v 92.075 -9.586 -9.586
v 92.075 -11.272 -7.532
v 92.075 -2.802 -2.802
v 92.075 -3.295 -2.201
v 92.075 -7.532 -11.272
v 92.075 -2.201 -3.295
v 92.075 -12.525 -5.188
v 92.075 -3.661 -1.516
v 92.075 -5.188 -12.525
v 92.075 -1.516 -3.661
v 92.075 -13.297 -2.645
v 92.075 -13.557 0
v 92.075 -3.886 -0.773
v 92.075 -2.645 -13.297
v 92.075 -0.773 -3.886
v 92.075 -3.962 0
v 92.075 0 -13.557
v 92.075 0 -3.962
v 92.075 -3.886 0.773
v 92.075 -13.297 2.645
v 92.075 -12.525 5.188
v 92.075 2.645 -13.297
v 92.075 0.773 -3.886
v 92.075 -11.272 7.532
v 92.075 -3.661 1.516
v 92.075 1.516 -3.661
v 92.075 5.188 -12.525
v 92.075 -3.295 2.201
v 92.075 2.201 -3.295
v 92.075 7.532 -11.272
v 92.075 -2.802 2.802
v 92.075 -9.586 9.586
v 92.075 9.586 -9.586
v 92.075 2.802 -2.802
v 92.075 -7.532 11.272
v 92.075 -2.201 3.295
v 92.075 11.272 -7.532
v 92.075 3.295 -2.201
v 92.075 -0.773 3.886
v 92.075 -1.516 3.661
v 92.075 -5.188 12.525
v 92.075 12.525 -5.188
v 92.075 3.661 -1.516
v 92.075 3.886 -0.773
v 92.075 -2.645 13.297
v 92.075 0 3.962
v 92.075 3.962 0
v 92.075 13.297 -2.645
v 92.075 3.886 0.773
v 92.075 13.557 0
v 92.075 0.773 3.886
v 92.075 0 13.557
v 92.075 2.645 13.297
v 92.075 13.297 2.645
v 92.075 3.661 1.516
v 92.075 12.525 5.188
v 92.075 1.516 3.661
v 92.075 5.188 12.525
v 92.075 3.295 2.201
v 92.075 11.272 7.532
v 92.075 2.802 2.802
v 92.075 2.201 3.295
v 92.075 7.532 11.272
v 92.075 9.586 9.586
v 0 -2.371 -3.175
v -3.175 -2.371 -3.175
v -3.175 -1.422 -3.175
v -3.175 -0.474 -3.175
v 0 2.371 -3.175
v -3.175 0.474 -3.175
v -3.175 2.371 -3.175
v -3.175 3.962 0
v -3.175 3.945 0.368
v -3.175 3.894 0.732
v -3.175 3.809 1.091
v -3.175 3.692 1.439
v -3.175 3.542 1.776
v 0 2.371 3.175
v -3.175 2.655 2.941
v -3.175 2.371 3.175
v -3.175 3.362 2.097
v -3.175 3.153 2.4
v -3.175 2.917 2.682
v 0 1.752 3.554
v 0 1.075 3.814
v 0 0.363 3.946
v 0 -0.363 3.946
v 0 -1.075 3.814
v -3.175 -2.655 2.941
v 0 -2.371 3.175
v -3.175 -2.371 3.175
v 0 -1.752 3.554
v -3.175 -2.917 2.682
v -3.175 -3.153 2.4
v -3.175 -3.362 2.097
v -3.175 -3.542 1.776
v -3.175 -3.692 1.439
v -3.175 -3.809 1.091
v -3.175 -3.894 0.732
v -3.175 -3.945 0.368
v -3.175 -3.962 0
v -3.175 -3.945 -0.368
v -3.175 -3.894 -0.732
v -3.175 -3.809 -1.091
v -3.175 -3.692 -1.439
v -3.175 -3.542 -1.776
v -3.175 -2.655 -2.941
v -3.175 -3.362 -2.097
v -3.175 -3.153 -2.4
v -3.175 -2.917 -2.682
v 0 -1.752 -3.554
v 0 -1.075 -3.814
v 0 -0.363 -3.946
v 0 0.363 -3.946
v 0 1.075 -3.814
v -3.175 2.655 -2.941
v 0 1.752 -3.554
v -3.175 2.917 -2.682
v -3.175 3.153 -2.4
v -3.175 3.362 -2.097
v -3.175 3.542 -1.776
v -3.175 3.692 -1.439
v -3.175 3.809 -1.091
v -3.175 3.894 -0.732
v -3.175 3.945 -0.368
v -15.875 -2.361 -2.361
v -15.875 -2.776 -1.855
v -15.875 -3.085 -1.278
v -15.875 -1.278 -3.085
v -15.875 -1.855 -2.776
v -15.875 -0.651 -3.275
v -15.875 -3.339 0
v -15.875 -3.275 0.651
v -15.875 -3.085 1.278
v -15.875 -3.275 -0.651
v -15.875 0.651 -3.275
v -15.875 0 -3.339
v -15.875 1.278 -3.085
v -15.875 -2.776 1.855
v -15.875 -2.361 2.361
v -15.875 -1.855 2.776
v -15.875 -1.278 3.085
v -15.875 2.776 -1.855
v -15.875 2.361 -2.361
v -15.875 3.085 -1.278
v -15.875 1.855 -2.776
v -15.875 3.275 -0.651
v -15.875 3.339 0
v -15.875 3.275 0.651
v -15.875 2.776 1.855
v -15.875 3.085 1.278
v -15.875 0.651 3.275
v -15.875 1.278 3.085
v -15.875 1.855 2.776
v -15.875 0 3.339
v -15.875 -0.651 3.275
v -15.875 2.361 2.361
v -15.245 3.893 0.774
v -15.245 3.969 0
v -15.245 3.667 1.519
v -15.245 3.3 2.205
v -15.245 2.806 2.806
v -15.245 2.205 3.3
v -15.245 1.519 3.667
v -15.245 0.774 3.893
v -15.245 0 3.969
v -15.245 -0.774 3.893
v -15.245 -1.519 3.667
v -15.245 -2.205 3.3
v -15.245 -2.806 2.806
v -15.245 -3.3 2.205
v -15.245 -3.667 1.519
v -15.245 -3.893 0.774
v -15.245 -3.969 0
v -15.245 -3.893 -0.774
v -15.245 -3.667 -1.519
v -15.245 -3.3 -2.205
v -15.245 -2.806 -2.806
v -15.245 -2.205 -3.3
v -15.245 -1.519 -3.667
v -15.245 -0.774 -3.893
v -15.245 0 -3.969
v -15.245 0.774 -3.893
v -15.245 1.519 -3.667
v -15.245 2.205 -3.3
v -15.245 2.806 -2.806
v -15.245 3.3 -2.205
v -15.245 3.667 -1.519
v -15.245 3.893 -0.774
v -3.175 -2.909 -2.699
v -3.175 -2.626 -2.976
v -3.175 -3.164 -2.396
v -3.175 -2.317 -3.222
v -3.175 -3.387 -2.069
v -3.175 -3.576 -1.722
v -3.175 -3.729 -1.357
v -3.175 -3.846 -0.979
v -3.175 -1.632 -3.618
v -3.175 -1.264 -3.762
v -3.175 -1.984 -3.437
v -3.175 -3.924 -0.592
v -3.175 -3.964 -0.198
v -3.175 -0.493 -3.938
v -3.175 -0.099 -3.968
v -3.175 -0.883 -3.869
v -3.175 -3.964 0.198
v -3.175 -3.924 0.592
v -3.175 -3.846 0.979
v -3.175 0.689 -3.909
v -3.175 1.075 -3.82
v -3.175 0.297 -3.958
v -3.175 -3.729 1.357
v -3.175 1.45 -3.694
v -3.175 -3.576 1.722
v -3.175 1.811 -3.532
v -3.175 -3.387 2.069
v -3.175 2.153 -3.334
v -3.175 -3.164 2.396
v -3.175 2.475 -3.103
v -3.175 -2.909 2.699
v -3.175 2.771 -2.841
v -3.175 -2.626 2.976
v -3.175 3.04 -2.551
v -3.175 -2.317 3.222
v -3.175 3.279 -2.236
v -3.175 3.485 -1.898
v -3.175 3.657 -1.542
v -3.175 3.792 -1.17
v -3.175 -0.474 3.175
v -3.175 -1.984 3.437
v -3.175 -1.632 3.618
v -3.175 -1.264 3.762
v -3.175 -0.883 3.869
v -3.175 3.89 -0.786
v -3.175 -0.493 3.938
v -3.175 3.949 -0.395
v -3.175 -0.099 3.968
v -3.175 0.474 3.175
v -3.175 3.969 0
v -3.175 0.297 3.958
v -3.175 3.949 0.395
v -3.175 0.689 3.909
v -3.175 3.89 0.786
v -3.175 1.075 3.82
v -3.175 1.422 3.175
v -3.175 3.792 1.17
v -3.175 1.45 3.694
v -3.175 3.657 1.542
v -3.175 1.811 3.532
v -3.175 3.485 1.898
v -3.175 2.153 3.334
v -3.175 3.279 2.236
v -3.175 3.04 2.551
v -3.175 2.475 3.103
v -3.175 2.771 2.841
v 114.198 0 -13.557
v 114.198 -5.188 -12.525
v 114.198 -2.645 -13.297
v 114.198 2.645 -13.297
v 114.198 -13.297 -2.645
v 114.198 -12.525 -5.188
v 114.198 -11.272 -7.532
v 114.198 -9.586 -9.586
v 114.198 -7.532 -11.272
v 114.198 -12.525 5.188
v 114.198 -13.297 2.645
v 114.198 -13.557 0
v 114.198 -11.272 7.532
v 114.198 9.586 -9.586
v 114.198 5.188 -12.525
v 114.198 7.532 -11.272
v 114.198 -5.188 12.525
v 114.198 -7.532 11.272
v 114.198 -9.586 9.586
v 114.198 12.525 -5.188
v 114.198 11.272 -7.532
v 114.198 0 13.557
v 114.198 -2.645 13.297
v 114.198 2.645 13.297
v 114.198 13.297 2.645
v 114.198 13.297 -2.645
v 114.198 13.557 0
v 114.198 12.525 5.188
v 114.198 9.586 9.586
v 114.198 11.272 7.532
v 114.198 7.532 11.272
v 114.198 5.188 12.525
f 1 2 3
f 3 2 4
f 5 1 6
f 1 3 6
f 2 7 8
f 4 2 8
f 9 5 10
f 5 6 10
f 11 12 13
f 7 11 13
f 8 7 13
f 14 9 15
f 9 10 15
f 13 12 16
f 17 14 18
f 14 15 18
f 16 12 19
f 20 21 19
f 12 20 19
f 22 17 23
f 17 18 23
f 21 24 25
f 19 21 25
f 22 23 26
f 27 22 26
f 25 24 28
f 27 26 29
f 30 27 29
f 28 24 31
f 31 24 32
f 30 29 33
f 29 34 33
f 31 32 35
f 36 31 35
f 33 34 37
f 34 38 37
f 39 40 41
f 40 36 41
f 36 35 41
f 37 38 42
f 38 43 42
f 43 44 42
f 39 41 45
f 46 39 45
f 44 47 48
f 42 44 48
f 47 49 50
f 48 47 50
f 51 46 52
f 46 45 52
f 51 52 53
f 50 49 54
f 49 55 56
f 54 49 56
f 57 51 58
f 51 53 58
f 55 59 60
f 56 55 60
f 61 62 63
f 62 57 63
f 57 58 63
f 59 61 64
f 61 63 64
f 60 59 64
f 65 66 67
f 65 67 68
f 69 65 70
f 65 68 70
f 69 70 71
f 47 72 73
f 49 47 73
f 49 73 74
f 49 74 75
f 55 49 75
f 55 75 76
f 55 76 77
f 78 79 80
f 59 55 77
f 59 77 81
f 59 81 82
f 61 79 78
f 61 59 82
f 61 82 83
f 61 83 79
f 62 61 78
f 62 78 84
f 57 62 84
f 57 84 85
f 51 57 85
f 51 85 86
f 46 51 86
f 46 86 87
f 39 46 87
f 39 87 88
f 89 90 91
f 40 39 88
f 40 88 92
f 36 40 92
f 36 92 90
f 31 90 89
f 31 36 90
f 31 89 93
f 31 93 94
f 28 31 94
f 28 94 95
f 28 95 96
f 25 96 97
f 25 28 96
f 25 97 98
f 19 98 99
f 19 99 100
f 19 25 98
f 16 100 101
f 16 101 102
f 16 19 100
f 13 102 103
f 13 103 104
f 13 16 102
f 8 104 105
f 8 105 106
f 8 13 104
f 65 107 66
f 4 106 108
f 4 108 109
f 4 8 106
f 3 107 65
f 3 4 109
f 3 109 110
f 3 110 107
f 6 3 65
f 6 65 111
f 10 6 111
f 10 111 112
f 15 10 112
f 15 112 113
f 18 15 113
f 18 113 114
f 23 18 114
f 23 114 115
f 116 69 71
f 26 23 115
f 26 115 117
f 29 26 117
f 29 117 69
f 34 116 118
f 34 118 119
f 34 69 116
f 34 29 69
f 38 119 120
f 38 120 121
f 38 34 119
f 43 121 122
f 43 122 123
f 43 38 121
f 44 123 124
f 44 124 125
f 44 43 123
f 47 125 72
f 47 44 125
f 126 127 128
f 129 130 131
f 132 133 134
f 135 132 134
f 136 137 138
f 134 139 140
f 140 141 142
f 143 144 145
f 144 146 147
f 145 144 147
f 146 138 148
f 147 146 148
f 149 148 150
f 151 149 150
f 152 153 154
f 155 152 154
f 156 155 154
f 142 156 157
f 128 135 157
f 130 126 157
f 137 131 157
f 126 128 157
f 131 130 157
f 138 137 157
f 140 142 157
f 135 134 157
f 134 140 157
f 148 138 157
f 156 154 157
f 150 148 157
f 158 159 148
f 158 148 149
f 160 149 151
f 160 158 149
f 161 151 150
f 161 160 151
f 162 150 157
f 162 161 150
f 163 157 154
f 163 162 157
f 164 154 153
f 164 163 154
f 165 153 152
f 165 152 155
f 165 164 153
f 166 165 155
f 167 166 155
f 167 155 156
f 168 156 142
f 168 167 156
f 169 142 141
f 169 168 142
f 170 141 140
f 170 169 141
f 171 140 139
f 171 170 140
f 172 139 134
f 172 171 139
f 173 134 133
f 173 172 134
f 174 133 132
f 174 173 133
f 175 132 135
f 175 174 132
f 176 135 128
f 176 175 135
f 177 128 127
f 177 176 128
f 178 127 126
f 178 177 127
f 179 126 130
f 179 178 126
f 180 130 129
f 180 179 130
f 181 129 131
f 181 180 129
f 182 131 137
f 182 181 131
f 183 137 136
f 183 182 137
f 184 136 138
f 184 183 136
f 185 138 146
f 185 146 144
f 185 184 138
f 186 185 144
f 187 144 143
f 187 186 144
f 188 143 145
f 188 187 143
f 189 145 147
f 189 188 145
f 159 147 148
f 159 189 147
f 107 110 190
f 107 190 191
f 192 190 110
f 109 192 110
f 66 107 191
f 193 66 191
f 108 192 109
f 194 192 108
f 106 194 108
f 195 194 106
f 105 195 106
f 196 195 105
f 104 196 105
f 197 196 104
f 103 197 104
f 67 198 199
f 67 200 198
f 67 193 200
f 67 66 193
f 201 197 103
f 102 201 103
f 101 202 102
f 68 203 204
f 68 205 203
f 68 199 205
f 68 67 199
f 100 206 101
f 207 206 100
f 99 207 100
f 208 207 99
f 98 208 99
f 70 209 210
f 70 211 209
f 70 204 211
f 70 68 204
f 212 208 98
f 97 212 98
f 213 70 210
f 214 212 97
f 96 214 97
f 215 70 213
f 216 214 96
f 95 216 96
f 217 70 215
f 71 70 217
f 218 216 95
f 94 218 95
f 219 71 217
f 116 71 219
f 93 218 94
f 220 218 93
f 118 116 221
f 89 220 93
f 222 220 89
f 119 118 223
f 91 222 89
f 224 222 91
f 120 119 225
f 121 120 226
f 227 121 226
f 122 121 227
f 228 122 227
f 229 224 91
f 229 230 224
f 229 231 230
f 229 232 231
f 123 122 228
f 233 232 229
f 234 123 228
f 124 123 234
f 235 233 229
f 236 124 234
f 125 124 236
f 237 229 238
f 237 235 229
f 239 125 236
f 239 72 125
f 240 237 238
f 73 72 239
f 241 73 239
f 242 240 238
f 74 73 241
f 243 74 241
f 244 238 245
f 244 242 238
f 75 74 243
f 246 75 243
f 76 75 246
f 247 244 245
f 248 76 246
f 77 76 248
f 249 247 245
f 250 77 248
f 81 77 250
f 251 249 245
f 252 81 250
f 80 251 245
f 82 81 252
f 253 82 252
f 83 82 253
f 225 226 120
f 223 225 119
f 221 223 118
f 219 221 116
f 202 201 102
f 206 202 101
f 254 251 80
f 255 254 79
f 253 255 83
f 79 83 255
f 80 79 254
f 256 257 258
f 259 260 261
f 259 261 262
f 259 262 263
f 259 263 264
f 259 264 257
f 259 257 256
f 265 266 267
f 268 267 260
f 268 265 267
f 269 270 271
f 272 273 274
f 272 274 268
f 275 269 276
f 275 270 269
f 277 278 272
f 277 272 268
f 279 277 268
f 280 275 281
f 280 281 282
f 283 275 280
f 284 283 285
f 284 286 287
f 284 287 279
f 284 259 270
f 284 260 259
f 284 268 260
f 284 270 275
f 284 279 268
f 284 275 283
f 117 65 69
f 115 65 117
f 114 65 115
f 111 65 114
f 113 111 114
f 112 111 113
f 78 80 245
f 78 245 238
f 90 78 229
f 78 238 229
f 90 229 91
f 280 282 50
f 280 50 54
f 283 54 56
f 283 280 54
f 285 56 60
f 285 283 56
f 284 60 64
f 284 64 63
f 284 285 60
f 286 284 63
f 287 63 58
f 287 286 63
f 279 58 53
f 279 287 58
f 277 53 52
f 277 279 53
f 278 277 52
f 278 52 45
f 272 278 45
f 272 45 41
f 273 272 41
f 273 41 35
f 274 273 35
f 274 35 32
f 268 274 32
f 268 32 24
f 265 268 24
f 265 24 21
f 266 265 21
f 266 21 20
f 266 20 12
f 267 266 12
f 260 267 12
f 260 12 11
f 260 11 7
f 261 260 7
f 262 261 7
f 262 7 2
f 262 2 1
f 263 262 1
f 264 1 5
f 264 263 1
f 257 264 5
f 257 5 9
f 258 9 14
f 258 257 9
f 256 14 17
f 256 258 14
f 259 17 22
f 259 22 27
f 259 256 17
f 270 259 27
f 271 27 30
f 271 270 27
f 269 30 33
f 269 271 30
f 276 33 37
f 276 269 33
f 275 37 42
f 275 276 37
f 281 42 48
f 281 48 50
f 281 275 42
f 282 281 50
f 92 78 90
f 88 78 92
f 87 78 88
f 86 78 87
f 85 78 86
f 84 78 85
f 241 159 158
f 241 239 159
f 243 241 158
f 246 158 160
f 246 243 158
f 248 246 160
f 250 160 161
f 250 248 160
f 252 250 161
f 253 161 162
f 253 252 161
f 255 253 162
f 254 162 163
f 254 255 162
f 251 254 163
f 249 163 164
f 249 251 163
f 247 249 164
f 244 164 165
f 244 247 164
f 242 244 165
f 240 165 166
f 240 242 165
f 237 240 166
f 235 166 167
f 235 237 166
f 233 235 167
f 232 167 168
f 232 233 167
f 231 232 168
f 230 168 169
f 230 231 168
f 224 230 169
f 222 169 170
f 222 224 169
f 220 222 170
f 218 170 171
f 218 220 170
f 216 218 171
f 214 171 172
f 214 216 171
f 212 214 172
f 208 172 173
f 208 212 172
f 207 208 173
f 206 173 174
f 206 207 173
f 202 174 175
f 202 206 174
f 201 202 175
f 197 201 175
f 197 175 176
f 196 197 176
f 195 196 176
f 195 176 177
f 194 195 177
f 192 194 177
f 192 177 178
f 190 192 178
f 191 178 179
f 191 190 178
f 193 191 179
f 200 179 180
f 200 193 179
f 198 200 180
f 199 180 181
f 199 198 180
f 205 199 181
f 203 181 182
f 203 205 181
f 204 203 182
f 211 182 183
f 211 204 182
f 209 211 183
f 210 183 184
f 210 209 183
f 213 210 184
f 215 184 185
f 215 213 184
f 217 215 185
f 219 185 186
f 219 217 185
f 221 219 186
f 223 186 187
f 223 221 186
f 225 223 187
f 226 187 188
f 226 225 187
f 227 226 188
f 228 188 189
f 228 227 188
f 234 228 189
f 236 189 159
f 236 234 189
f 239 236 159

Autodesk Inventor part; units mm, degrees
sketch "Sketch_1" plane through (0, 0, 0) normal (0, 0, 1) x (1, 0, 0)
  line L0 (114.1984, 0) -> (-3.175, 0)
  line L1 (-3.175, 0) -> (-3.175, 3.9624)
  line L2 (-3.175, 3.9624) -> (92.075, 3.9624)
  line L3 (92.075, 3.9624) -> (92.075, 13.5572)
  line L4 (92.075, 13.5572) -> (114.1984, 13.5572)
  line L5 (114.1984, 13.5572) -> (114.1984, 0)
  line L6 (114.1984, 0) -> (-3.175, 0)
revolve "Revolution1" add sketch "Sketch_1" angle 360 about axis through (114.1984, 0, 0) along (1, 0, 0)
sketch "Sketch_3" plane through (0, 0, 0) normal (0, 0, 1) x (1, 0, 0)
  line L0 (-3.175, 0) -> (-15.875, 0)
  line L1 (-15.875, 0) -> (-15.875, 3.3388)
  line L2 (-15.875, 3.3388) -> (-15.2451, 3.9688)
  line L3 (-15.2451, 3.9688) -> (-3.175, 3.9688)
  line L4 (-3.175, 3.9688) -> (-3.175, 0)
  line L5 (-3.175, 0) -> (-15.875, 0)
revolve "Revolution2" add sketch "Sketch_3" angle 360 about axis through (-3.175, 0, 0) along (1, 0, 0)
thread "Thread1" size "5/16-24 UNF" class "2A" standard "ANSI Unified Screw Threads" full length
sketch "Sketch_10" plane through (-3.175, 0, 0) normal (1, 0, 0) x (0, 0, -1)
  line L0 (-7.9248, -7.9248) -> (7.9248, -7.9248)
  line L1 (7.9248, -7.9248) -> (7.9248, 7.9248)
  line L2 (7.9248, 7.9248) -> (-7.9248, 7.9248)
  line L3 (-7.9248, 7.9248) -> (-7.9248, -7.9248)
  line L4 (-3.175, -3.9624) -> (3.175, -3.9624)
  line L5 (3.175, -3.9624) -> (3.175, 3.9624)
  line L6 (3.175, 3.9624) -> (-3.175, 3.9624)
  line L7 (-3.175, 3.9624) -> (-3.175, -3.9624)
extrude "Extrusion1" cut sketch "Sketch_10" along normal blind 3.175
ref_plane "dia1_XY" through (-3.175, 3.9624, 0) normal (1, 0, 0) x (0, 0, -1)
ref_plane "dia1_YZ" through (-3.175, 3.9624, 0) normal (0, 0, -1) x (0, 1, 0)
ref_plane "dia1_ZX" through (-3.175, 3.9624, 0) normal (0, 1, 0) x (1, 0, 0)
ref_plane "dia12_XY" through (0, 0, 14.1351) normal (1, 0, 0) x (0, 0, -1)
ref_plane "dia12_YZ" through (0, 0, 14.1351) normal (0, 0, -1) x (0, 1, 0)
ref_plane "dia12_ZX" through (0, 0, 14.1351) normal (0, 1, 0) x (1, 0, 0)
ref_plane "dia2_XY" through (-3.175, -3.9624, 0) normal (1, 0, 0) x (0, 0, -1)
ref_plane "dia2_YZ" through (-3.175, -3.9624, 0) normal (0, 0, -1) x (0, 1, 0)
ref_plane "dia2_ZX" through (-3.175, -3.9624, 0) normal (0, 1, 0) x (1, 0, 0)
ref_plane "dia22_XY" through (0, 0, -14.1351) normal (1, 0, 0) x (0, 0, -1)
ref_plane "dia22_YZ" through (0, 0, -14.1351) normal (0, 0, -1) x (0, 1, 0)
ref_plane "dia22_ZX" through (0, 0, -14.1351) normal (0, 1, 0) x (1, 0, 0)
ref_plane "rl1_XY" through (-15.875, 0, 0) normal (1, 0, 0) x (0, 0, -1)
ref_plane "rl1_YZ" through (-15.875, 0, 0) normal (0, 0, -1) x (0, 1, 0)
ref_plane "rl1_ZX" through (-15.875, 0, 0) normal (0, 1, 0) x (1, 0, 0)
ref_plane "rl2_XY" through (-3.175, 0, 0) normal (1, 0, 0) x (0, 0, -1)
ref_plane "rl2_YZ" through (-3.175, 0, 0) normal (0, 0, -1) x (0, 1, 0)
ref_plane "rl2_ZX" through (-3.175, 0, 0) normal (0, 1, 0) x (1, 0, 0)
ref_plane "rod_cp_XY" through (0, 0, 0) normal (1, 0, 0) x (0, 0, -1)
ref_plane "rod_cp_YZ" through (0, 0, 0) normal (0, 0, -1) x (0, 1, 0)
ref_plane "rod_cp_ZX" through (0, 0, 0) normal (0, 1, 0) x (1, 0, 0)
ref_plane "thd1_XY" through (-15.875, 3.9688, 0) normal (1, 0, 0) x (0, 0, -1)
ref_plane "thd1_YZ" through (-15.875, 3.9688, 0) normal (0, 0, -1) x (0, 1, 0)
ref_plane "thd1_ZX" through (-15.875, 3.9688, 0) normal (0, 1, 0) x (1, 0, 0)
ref_plane "thd2_XY" through (-15.875, -3.9688, 0) normal (1, 0, 0) x (0, 0, -1)
ref_plane "thd2_YZ" through (-15.875, -3.9688, 0) normal (0, 0, -1) x (0, 1, 0)
ref_plane "thd2_ZX" through (-15.875, -3.9688, 0) normal (0, 1, 0) x (1, 0, 0)
ref_plane "to_rod_clevis_XY" through (-20.701, 0, 0) normal (1, 0, 0) x (0, 0, -1)
ref_plane "to_rod_clevis_YZ" through (-20.701, 0, 0) normal (0, 0, -1) x (0, 1, 0)
ref_plane "to_rod_clevis_ZX" through (-20.701, 0, 0) normal (0, 1, 0) x (1, 0, 0)
ref_plane "wf1_XY" through (-3.175, 0, 0) normal (1, 0, 0) x (0, 0, -1)
ref_plane "wf1_YZ" through (-3.175, 0, 0) normal (0, 0, -1) x (0, 1, 0)
ref_plane "wf1_ZX" through (-3.175, 0, 0) normal (0, 1, 0) x (1, 0, 0)
ref_plane "wf2_XY" through (0, 0, 0) normal (1, 0, 0) x (0, 0, -1)
ref_plane "wf2_YZ" through (0, 0, 0) normal (0, 0, -1) x (0, 1, 0)
ref_plane "wf2_ZX" through (0, 0, 0) normal (0, 1, 0) x (1, 0, 0)
ref_plane "wfw1_XY" through (-3.175, 0, -3.175) normal (0, 1, 0) x (1, 0, 0)
ref_plane "wfw1_YZ" through (-3.175, 0, -3.175) normal (1, 0, 0) x (0, 0, -1)
ref_plane "wfw1_ZX" through (-3.175, 0, -3.175) normal (0, 0, -1) x (0, 1, 0)
ref_plane "wfw2_XY" through (-3.175, 0, 3.175) normal (0, 1, 0) x (1, 0, 0)
ref_plane "wfw2_YZ" through (-3.175, 0, 3.175) normal (1, 0, 0) x (0, 0, -1)
ref_plane "wfw2_ZX" through (-3.175, 0, 3.175) normal (0, 0, -1) x (0, 1, 0)
properties part number "SR-092-DPY0000_rod"
